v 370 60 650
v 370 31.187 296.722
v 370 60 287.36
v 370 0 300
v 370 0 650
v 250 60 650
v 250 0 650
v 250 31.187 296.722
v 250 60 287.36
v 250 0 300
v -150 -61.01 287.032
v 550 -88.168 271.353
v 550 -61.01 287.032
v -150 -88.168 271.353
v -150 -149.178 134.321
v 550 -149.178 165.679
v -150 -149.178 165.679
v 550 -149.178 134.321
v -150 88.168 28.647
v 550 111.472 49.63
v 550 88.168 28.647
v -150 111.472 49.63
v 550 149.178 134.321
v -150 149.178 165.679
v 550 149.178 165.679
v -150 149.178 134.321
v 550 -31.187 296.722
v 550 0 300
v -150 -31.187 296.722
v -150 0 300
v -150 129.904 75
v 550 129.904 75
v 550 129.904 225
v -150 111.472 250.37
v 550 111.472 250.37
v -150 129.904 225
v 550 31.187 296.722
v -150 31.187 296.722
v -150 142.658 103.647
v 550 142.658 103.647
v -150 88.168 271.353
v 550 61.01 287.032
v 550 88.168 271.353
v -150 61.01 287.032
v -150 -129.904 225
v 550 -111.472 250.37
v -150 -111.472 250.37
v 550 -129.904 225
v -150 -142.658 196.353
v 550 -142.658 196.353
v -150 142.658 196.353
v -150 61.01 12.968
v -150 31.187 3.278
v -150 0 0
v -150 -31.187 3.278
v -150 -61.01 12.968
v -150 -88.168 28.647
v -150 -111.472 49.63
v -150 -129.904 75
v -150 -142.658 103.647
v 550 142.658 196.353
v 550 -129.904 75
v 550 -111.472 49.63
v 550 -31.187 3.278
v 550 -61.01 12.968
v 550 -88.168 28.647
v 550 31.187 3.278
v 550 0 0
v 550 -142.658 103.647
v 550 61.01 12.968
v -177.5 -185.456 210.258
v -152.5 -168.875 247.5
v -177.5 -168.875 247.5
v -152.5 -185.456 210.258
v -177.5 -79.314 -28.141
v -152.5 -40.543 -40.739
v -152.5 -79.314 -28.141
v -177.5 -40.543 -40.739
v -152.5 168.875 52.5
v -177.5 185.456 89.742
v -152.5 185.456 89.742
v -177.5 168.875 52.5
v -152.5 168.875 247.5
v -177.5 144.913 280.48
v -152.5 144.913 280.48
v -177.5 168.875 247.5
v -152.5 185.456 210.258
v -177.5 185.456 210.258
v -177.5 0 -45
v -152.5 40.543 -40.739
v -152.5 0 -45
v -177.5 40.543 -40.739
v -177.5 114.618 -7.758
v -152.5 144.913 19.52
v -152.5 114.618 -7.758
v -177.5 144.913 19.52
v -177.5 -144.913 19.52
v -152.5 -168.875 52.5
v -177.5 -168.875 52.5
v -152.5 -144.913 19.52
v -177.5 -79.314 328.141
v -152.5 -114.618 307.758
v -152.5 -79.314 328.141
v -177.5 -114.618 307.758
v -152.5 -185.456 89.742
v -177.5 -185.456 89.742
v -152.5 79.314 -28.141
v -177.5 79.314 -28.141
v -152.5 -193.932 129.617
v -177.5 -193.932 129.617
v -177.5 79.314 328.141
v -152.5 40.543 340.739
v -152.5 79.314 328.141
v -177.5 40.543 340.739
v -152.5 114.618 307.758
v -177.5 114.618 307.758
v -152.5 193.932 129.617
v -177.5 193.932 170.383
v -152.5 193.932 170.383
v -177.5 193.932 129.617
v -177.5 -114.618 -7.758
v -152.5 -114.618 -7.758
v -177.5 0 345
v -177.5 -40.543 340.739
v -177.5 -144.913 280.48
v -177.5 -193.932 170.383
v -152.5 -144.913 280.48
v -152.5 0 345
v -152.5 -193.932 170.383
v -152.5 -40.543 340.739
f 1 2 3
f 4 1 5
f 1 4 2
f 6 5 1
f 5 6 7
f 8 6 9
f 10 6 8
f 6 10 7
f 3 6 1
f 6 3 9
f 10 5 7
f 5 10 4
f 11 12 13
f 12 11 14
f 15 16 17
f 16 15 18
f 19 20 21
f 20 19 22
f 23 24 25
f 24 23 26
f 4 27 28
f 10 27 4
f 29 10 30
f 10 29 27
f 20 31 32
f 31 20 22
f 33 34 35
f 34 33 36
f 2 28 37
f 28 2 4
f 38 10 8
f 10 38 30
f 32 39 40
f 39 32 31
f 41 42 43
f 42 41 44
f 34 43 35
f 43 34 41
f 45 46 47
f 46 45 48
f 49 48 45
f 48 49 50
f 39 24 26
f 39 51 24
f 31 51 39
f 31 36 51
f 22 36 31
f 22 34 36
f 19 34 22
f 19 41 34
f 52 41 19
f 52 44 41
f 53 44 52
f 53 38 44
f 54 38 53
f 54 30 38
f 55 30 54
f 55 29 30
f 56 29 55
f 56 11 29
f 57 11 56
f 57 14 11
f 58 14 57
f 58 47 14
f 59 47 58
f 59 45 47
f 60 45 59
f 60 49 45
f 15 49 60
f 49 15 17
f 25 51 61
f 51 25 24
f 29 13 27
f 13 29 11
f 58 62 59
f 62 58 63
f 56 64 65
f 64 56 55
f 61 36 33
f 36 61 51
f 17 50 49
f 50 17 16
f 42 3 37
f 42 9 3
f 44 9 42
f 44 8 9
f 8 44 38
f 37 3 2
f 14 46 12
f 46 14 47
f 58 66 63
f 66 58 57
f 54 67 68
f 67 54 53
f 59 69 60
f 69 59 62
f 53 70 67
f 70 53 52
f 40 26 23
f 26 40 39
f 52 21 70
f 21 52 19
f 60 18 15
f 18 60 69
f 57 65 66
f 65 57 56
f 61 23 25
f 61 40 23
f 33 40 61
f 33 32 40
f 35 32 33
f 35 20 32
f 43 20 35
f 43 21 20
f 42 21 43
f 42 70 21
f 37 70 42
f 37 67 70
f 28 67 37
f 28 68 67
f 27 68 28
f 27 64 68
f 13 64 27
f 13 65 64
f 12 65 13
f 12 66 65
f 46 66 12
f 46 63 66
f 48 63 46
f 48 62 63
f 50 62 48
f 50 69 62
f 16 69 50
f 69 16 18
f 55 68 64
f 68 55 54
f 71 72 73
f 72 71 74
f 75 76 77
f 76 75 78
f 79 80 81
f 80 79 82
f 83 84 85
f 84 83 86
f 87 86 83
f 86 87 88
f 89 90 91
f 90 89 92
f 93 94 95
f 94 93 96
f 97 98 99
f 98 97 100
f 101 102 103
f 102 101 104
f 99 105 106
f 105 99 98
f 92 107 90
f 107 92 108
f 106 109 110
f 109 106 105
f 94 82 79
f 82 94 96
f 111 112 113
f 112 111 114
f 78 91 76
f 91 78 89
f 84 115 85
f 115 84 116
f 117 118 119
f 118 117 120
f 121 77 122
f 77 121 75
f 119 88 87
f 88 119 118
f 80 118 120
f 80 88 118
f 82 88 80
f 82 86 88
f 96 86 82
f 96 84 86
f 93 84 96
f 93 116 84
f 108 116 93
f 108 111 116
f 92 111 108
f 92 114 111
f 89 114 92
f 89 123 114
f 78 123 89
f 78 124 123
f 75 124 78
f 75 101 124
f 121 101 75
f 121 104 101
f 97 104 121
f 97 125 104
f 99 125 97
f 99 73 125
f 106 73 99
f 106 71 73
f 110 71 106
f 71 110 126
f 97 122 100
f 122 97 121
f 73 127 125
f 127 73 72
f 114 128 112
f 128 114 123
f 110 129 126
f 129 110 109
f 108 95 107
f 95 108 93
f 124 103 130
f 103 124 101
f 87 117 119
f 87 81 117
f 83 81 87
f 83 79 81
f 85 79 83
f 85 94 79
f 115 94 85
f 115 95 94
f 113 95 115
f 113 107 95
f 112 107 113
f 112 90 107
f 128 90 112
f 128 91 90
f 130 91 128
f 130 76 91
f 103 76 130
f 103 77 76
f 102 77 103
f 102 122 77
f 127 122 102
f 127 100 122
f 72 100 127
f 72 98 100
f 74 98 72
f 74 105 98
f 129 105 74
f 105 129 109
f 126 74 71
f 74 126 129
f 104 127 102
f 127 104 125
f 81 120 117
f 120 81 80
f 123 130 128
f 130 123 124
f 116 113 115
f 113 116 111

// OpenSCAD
// stern_pod.scad — placeholder electric pod drive under the transom
include <../params.scad>

module stern_pod() {
  color("dimgray") {
    // strut from hull
    translate([250, 0, 150])
      cube([120, 60, 500], center = false);
    // pod body along x
    translate([550, 0, 150])
      rotate([0, -90, 0])
        cylinder(h = sternpod_len, d = sternpod_dia);
    // prop disc at aft end
    color("goldenrod")
      translate([550 - sternpod_len - 15, 0, 150])
        rotate([0, 90, 0])
          cylinder(h = 25, d = sternpod_dia + 90, center = true);
  }
}

stern_pod();   // demo
